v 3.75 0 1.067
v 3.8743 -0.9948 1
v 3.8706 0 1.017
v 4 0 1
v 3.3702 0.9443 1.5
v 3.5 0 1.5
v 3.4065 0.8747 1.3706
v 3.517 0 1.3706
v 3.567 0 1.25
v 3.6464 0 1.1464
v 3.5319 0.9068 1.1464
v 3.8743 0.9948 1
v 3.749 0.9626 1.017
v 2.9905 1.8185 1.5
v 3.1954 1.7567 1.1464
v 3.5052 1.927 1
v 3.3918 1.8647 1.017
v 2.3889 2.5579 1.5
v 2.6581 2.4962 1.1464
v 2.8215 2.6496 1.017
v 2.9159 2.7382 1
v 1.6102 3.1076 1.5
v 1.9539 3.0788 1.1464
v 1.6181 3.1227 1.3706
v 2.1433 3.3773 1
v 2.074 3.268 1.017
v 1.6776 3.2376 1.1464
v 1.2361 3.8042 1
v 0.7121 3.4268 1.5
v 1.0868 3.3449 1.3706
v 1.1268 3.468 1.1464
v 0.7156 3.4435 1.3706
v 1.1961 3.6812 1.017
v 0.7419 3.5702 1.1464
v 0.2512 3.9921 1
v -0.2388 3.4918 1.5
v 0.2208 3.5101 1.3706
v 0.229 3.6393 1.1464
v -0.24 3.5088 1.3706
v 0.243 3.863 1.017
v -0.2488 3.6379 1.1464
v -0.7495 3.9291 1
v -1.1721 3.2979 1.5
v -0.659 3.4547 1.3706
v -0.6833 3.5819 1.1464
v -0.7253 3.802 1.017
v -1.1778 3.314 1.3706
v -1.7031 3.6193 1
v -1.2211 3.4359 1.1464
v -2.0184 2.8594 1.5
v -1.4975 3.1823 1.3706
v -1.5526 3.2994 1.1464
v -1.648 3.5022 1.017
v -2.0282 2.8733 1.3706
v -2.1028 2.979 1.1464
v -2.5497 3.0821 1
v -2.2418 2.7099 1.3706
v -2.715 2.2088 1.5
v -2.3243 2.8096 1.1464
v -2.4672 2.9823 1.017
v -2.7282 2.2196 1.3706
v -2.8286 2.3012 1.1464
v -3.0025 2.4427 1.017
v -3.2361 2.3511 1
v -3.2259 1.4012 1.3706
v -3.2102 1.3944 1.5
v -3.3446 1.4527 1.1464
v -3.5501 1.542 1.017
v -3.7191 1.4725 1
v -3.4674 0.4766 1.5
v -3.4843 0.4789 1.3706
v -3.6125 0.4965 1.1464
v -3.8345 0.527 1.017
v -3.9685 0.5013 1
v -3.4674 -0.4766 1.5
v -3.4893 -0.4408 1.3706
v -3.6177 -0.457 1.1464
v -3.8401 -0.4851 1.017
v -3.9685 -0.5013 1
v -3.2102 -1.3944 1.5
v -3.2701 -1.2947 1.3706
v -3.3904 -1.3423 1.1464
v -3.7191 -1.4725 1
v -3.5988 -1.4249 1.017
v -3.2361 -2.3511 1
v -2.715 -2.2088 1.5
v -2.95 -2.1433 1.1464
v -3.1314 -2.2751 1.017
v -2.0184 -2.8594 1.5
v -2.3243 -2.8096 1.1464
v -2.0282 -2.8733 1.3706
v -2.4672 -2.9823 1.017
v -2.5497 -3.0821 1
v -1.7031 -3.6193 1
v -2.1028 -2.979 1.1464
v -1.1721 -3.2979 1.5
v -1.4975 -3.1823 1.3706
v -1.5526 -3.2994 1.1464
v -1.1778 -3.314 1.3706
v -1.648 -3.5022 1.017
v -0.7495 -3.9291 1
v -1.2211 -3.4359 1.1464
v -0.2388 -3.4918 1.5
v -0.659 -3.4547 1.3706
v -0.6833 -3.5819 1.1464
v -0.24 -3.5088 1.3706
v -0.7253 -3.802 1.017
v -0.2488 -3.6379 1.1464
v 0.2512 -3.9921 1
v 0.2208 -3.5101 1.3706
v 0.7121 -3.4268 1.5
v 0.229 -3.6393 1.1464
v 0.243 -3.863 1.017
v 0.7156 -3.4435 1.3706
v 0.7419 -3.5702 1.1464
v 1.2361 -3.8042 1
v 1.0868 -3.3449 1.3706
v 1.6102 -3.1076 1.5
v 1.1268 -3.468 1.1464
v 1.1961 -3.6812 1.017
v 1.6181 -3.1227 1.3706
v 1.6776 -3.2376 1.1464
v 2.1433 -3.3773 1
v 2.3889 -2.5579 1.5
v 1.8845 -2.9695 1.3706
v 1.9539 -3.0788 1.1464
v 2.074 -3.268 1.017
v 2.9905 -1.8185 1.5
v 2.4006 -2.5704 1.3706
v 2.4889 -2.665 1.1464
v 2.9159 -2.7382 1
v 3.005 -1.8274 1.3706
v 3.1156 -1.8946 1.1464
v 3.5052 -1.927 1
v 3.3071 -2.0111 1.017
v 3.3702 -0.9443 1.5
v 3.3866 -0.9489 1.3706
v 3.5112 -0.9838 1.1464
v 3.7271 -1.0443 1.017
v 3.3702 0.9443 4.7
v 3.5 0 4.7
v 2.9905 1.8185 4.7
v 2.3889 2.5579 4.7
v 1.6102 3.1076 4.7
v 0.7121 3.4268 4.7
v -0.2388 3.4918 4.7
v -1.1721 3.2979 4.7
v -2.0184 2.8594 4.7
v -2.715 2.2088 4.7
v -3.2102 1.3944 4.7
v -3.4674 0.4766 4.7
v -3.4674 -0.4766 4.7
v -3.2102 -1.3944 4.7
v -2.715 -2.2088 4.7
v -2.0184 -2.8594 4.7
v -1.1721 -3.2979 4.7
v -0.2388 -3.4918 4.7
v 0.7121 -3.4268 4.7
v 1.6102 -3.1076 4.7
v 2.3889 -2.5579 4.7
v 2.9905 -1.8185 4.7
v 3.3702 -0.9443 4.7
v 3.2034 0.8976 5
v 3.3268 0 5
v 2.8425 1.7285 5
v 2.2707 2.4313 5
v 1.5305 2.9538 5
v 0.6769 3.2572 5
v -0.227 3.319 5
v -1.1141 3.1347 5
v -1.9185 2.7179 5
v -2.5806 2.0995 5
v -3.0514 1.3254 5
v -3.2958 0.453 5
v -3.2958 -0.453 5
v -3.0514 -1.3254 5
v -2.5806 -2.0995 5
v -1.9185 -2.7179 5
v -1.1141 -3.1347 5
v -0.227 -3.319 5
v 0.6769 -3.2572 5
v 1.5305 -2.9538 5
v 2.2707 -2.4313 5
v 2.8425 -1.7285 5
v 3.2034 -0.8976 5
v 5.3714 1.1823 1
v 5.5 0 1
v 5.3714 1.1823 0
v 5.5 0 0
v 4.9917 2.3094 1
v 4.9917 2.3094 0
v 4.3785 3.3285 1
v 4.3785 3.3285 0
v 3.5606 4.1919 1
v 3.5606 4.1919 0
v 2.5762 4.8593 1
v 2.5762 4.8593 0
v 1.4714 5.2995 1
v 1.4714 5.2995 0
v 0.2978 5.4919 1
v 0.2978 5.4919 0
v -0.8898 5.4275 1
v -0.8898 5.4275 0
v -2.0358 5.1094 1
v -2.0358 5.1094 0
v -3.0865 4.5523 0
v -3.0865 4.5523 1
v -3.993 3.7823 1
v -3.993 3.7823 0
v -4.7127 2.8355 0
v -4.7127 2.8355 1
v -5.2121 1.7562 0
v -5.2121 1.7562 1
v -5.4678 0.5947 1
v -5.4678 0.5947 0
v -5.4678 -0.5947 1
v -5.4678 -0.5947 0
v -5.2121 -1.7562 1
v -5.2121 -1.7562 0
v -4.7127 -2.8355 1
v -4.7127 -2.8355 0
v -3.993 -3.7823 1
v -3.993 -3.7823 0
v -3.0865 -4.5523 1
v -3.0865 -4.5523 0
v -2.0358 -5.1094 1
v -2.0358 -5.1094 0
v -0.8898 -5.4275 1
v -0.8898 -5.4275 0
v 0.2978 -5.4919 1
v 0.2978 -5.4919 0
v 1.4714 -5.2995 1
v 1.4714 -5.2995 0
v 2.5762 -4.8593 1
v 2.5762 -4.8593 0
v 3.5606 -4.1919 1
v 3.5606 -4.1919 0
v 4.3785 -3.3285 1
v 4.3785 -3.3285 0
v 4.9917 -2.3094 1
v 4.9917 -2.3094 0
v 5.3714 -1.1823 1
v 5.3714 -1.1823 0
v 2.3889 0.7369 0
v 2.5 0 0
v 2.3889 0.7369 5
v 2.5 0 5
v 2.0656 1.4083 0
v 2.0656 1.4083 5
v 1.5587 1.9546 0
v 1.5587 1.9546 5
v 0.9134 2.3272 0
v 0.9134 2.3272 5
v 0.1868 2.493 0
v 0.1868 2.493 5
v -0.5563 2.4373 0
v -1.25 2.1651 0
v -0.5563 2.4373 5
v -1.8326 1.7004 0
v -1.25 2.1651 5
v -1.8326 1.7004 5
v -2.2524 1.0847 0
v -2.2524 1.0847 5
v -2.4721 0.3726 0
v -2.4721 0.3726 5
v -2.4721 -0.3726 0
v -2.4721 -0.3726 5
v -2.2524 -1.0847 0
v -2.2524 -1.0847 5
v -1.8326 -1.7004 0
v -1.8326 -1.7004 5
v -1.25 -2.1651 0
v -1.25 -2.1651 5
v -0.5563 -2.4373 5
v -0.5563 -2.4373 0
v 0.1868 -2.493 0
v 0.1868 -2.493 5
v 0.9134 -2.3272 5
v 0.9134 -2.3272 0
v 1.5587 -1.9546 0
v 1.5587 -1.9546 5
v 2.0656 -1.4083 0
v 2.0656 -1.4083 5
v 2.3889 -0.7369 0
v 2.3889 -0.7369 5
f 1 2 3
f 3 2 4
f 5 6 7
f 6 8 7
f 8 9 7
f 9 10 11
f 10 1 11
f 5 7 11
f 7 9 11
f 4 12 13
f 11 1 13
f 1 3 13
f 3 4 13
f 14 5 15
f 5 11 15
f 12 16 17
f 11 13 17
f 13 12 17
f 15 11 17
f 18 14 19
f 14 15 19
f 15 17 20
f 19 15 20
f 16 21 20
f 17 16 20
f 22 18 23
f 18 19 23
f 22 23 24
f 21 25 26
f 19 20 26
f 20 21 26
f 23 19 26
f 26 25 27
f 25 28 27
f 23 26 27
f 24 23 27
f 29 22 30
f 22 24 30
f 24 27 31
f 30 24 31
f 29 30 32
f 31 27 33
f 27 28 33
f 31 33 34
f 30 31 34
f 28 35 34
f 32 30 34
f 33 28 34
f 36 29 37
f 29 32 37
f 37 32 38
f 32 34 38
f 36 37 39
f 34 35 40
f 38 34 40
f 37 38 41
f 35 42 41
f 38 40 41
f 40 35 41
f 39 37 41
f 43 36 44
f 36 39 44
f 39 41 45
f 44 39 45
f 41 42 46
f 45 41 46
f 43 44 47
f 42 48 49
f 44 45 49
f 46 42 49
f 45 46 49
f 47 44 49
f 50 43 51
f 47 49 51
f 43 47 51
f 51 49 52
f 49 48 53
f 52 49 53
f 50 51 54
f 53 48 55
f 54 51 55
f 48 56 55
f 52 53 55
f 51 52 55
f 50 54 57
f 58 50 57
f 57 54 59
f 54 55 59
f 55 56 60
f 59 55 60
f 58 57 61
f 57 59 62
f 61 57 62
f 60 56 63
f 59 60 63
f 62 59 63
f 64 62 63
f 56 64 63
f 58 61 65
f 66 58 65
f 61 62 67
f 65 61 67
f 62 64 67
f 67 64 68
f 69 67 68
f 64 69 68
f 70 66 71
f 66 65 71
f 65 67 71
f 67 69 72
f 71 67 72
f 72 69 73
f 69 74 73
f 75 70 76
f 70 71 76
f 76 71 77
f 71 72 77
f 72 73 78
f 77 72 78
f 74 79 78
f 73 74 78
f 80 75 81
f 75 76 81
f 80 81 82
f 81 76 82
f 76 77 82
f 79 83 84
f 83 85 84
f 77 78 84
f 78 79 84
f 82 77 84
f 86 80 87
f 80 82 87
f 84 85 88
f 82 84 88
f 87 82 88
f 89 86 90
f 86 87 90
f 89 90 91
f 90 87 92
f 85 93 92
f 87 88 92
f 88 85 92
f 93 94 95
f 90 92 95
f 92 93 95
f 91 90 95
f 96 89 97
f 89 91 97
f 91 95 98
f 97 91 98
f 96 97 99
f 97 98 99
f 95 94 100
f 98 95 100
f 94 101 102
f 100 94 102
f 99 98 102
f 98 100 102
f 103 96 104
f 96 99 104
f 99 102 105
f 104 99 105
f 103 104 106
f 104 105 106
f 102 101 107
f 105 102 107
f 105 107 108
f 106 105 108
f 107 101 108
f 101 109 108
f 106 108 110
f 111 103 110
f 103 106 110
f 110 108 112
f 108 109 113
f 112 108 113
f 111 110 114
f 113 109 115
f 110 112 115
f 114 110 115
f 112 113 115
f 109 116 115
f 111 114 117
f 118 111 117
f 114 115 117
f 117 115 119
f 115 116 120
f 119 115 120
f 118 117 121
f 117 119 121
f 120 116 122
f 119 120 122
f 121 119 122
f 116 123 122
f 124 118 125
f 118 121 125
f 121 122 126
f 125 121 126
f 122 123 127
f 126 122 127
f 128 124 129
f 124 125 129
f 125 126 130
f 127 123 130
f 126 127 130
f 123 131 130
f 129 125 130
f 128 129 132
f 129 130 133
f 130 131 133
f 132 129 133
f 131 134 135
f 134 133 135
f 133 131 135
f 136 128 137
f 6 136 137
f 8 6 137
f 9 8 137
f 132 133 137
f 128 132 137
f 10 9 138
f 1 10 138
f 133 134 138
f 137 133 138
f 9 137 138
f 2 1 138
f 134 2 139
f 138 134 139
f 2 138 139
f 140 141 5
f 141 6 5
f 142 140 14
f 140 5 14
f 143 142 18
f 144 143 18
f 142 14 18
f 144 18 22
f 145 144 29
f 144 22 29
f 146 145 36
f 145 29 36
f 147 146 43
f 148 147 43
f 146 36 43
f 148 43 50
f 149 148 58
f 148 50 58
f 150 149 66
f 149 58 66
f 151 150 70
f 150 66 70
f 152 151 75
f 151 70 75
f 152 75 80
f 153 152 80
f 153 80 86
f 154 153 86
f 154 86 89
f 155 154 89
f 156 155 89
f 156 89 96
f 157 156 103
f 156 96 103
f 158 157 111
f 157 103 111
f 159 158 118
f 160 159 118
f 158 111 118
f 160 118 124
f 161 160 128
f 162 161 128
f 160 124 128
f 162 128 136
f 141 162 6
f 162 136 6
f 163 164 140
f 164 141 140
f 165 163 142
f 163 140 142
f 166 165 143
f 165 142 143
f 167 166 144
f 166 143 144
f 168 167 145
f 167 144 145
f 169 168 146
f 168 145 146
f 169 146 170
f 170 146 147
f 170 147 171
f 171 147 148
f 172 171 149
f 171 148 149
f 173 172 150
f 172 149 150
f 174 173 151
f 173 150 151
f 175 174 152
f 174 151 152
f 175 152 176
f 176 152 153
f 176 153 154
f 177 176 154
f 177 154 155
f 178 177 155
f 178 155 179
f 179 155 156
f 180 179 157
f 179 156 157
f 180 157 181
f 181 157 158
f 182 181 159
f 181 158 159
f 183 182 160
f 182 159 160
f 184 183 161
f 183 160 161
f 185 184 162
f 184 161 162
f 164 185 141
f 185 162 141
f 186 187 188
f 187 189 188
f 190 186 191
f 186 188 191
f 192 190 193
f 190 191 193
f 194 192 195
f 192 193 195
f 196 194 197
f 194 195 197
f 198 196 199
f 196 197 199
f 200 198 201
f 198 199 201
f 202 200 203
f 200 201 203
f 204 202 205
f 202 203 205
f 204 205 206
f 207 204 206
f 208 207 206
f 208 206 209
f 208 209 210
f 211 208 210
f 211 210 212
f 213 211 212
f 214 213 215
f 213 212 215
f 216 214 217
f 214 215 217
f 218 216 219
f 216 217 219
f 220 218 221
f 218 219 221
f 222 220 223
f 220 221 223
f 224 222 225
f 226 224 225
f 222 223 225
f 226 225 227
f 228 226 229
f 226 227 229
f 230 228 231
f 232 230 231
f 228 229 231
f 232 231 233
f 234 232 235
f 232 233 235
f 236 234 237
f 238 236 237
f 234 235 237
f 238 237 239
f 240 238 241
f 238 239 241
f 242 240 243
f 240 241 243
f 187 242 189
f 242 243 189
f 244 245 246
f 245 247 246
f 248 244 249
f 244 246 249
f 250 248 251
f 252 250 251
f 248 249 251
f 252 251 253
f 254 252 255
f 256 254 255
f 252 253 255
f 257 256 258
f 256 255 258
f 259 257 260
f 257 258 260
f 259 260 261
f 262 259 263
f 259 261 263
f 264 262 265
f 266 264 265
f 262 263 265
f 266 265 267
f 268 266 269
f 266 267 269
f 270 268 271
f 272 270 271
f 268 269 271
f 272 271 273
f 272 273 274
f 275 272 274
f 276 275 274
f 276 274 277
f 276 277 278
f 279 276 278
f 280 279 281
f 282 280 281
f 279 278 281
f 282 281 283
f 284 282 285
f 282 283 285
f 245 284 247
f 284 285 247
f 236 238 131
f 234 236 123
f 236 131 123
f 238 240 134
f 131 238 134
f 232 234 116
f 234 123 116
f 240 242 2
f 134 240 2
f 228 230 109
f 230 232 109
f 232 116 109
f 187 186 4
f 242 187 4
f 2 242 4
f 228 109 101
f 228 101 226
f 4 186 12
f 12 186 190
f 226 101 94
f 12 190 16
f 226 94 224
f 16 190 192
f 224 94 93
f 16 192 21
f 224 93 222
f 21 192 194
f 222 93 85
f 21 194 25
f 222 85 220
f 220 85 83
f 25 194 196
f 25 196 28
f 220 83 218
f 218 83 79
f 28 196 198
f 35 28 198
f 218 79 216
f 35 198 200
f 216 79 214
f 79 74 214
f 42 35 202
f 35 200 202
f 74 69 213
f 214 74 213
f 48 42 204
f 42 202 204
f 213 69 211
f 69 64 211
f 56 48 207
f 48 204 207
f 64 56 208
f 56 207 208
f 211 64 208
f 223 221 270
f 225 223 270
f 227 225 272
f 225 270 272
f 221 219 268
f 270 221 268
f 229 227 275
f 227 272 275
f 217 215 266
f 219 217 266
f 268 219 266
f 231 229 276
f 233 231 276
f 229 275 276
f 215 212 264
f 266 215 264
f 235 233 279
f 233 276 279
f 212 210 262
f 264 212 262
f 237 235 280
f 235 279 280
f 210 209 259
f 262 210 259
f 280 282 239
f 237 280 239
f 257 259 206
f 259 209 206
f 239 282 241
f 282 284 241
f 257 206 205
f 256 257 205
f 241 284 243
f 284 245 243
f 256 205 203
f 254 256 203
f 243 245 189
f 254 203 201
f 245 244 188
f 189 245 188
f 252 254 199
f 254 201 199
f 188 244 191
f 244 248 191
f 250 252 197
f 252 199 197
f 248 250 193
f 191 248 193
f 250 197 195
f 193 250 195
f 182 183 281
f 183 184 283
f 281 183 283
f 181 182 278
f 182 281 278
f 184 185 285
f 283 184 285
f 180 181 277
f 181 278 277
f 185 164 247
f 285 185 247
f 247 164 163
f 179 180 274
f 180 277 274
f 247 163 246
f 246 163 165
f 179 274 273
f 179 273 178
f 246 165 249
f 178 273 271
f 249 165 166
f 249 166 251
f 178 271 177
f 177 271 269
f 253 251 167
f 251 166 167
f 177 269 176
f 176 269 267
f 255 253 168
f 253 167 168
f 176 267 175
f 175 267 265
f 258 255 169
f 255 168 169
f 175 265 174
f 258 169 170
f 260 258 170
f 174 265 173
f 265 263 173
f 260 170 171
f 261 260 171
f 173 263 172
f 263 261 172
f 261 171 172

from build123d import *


with BuildPart() as part:
    # Sketch1 → Revolve1 (revolve)
    with BuildSketch(Plane(origin=(0, 0, 0), x_dir=(1, 0, 0), z_dir=(0, 1, 0))):
        with BuildLine():
            Line((3.5, -4.7), (3.5, -1.5))
            ThreePointArc((3.5, -1.5), (3.646446609, -1.146446609), (4, -1))
            Line((4, -1), (5.5, -1))
            Line((5.5, -1), (5.5, 0))
            Line((5.5, 0), (2.5, 0))
            Line((2.5, 0), (2.5, -5))
            Line((2.5, -5), (3.326794919, -5))
            Line((3.326794919, -5), (3.5, -4.7))
        make_face()
    revolve(axis=Axis((0, 0, 0), (0, 0, 1)))


solid = part.part
